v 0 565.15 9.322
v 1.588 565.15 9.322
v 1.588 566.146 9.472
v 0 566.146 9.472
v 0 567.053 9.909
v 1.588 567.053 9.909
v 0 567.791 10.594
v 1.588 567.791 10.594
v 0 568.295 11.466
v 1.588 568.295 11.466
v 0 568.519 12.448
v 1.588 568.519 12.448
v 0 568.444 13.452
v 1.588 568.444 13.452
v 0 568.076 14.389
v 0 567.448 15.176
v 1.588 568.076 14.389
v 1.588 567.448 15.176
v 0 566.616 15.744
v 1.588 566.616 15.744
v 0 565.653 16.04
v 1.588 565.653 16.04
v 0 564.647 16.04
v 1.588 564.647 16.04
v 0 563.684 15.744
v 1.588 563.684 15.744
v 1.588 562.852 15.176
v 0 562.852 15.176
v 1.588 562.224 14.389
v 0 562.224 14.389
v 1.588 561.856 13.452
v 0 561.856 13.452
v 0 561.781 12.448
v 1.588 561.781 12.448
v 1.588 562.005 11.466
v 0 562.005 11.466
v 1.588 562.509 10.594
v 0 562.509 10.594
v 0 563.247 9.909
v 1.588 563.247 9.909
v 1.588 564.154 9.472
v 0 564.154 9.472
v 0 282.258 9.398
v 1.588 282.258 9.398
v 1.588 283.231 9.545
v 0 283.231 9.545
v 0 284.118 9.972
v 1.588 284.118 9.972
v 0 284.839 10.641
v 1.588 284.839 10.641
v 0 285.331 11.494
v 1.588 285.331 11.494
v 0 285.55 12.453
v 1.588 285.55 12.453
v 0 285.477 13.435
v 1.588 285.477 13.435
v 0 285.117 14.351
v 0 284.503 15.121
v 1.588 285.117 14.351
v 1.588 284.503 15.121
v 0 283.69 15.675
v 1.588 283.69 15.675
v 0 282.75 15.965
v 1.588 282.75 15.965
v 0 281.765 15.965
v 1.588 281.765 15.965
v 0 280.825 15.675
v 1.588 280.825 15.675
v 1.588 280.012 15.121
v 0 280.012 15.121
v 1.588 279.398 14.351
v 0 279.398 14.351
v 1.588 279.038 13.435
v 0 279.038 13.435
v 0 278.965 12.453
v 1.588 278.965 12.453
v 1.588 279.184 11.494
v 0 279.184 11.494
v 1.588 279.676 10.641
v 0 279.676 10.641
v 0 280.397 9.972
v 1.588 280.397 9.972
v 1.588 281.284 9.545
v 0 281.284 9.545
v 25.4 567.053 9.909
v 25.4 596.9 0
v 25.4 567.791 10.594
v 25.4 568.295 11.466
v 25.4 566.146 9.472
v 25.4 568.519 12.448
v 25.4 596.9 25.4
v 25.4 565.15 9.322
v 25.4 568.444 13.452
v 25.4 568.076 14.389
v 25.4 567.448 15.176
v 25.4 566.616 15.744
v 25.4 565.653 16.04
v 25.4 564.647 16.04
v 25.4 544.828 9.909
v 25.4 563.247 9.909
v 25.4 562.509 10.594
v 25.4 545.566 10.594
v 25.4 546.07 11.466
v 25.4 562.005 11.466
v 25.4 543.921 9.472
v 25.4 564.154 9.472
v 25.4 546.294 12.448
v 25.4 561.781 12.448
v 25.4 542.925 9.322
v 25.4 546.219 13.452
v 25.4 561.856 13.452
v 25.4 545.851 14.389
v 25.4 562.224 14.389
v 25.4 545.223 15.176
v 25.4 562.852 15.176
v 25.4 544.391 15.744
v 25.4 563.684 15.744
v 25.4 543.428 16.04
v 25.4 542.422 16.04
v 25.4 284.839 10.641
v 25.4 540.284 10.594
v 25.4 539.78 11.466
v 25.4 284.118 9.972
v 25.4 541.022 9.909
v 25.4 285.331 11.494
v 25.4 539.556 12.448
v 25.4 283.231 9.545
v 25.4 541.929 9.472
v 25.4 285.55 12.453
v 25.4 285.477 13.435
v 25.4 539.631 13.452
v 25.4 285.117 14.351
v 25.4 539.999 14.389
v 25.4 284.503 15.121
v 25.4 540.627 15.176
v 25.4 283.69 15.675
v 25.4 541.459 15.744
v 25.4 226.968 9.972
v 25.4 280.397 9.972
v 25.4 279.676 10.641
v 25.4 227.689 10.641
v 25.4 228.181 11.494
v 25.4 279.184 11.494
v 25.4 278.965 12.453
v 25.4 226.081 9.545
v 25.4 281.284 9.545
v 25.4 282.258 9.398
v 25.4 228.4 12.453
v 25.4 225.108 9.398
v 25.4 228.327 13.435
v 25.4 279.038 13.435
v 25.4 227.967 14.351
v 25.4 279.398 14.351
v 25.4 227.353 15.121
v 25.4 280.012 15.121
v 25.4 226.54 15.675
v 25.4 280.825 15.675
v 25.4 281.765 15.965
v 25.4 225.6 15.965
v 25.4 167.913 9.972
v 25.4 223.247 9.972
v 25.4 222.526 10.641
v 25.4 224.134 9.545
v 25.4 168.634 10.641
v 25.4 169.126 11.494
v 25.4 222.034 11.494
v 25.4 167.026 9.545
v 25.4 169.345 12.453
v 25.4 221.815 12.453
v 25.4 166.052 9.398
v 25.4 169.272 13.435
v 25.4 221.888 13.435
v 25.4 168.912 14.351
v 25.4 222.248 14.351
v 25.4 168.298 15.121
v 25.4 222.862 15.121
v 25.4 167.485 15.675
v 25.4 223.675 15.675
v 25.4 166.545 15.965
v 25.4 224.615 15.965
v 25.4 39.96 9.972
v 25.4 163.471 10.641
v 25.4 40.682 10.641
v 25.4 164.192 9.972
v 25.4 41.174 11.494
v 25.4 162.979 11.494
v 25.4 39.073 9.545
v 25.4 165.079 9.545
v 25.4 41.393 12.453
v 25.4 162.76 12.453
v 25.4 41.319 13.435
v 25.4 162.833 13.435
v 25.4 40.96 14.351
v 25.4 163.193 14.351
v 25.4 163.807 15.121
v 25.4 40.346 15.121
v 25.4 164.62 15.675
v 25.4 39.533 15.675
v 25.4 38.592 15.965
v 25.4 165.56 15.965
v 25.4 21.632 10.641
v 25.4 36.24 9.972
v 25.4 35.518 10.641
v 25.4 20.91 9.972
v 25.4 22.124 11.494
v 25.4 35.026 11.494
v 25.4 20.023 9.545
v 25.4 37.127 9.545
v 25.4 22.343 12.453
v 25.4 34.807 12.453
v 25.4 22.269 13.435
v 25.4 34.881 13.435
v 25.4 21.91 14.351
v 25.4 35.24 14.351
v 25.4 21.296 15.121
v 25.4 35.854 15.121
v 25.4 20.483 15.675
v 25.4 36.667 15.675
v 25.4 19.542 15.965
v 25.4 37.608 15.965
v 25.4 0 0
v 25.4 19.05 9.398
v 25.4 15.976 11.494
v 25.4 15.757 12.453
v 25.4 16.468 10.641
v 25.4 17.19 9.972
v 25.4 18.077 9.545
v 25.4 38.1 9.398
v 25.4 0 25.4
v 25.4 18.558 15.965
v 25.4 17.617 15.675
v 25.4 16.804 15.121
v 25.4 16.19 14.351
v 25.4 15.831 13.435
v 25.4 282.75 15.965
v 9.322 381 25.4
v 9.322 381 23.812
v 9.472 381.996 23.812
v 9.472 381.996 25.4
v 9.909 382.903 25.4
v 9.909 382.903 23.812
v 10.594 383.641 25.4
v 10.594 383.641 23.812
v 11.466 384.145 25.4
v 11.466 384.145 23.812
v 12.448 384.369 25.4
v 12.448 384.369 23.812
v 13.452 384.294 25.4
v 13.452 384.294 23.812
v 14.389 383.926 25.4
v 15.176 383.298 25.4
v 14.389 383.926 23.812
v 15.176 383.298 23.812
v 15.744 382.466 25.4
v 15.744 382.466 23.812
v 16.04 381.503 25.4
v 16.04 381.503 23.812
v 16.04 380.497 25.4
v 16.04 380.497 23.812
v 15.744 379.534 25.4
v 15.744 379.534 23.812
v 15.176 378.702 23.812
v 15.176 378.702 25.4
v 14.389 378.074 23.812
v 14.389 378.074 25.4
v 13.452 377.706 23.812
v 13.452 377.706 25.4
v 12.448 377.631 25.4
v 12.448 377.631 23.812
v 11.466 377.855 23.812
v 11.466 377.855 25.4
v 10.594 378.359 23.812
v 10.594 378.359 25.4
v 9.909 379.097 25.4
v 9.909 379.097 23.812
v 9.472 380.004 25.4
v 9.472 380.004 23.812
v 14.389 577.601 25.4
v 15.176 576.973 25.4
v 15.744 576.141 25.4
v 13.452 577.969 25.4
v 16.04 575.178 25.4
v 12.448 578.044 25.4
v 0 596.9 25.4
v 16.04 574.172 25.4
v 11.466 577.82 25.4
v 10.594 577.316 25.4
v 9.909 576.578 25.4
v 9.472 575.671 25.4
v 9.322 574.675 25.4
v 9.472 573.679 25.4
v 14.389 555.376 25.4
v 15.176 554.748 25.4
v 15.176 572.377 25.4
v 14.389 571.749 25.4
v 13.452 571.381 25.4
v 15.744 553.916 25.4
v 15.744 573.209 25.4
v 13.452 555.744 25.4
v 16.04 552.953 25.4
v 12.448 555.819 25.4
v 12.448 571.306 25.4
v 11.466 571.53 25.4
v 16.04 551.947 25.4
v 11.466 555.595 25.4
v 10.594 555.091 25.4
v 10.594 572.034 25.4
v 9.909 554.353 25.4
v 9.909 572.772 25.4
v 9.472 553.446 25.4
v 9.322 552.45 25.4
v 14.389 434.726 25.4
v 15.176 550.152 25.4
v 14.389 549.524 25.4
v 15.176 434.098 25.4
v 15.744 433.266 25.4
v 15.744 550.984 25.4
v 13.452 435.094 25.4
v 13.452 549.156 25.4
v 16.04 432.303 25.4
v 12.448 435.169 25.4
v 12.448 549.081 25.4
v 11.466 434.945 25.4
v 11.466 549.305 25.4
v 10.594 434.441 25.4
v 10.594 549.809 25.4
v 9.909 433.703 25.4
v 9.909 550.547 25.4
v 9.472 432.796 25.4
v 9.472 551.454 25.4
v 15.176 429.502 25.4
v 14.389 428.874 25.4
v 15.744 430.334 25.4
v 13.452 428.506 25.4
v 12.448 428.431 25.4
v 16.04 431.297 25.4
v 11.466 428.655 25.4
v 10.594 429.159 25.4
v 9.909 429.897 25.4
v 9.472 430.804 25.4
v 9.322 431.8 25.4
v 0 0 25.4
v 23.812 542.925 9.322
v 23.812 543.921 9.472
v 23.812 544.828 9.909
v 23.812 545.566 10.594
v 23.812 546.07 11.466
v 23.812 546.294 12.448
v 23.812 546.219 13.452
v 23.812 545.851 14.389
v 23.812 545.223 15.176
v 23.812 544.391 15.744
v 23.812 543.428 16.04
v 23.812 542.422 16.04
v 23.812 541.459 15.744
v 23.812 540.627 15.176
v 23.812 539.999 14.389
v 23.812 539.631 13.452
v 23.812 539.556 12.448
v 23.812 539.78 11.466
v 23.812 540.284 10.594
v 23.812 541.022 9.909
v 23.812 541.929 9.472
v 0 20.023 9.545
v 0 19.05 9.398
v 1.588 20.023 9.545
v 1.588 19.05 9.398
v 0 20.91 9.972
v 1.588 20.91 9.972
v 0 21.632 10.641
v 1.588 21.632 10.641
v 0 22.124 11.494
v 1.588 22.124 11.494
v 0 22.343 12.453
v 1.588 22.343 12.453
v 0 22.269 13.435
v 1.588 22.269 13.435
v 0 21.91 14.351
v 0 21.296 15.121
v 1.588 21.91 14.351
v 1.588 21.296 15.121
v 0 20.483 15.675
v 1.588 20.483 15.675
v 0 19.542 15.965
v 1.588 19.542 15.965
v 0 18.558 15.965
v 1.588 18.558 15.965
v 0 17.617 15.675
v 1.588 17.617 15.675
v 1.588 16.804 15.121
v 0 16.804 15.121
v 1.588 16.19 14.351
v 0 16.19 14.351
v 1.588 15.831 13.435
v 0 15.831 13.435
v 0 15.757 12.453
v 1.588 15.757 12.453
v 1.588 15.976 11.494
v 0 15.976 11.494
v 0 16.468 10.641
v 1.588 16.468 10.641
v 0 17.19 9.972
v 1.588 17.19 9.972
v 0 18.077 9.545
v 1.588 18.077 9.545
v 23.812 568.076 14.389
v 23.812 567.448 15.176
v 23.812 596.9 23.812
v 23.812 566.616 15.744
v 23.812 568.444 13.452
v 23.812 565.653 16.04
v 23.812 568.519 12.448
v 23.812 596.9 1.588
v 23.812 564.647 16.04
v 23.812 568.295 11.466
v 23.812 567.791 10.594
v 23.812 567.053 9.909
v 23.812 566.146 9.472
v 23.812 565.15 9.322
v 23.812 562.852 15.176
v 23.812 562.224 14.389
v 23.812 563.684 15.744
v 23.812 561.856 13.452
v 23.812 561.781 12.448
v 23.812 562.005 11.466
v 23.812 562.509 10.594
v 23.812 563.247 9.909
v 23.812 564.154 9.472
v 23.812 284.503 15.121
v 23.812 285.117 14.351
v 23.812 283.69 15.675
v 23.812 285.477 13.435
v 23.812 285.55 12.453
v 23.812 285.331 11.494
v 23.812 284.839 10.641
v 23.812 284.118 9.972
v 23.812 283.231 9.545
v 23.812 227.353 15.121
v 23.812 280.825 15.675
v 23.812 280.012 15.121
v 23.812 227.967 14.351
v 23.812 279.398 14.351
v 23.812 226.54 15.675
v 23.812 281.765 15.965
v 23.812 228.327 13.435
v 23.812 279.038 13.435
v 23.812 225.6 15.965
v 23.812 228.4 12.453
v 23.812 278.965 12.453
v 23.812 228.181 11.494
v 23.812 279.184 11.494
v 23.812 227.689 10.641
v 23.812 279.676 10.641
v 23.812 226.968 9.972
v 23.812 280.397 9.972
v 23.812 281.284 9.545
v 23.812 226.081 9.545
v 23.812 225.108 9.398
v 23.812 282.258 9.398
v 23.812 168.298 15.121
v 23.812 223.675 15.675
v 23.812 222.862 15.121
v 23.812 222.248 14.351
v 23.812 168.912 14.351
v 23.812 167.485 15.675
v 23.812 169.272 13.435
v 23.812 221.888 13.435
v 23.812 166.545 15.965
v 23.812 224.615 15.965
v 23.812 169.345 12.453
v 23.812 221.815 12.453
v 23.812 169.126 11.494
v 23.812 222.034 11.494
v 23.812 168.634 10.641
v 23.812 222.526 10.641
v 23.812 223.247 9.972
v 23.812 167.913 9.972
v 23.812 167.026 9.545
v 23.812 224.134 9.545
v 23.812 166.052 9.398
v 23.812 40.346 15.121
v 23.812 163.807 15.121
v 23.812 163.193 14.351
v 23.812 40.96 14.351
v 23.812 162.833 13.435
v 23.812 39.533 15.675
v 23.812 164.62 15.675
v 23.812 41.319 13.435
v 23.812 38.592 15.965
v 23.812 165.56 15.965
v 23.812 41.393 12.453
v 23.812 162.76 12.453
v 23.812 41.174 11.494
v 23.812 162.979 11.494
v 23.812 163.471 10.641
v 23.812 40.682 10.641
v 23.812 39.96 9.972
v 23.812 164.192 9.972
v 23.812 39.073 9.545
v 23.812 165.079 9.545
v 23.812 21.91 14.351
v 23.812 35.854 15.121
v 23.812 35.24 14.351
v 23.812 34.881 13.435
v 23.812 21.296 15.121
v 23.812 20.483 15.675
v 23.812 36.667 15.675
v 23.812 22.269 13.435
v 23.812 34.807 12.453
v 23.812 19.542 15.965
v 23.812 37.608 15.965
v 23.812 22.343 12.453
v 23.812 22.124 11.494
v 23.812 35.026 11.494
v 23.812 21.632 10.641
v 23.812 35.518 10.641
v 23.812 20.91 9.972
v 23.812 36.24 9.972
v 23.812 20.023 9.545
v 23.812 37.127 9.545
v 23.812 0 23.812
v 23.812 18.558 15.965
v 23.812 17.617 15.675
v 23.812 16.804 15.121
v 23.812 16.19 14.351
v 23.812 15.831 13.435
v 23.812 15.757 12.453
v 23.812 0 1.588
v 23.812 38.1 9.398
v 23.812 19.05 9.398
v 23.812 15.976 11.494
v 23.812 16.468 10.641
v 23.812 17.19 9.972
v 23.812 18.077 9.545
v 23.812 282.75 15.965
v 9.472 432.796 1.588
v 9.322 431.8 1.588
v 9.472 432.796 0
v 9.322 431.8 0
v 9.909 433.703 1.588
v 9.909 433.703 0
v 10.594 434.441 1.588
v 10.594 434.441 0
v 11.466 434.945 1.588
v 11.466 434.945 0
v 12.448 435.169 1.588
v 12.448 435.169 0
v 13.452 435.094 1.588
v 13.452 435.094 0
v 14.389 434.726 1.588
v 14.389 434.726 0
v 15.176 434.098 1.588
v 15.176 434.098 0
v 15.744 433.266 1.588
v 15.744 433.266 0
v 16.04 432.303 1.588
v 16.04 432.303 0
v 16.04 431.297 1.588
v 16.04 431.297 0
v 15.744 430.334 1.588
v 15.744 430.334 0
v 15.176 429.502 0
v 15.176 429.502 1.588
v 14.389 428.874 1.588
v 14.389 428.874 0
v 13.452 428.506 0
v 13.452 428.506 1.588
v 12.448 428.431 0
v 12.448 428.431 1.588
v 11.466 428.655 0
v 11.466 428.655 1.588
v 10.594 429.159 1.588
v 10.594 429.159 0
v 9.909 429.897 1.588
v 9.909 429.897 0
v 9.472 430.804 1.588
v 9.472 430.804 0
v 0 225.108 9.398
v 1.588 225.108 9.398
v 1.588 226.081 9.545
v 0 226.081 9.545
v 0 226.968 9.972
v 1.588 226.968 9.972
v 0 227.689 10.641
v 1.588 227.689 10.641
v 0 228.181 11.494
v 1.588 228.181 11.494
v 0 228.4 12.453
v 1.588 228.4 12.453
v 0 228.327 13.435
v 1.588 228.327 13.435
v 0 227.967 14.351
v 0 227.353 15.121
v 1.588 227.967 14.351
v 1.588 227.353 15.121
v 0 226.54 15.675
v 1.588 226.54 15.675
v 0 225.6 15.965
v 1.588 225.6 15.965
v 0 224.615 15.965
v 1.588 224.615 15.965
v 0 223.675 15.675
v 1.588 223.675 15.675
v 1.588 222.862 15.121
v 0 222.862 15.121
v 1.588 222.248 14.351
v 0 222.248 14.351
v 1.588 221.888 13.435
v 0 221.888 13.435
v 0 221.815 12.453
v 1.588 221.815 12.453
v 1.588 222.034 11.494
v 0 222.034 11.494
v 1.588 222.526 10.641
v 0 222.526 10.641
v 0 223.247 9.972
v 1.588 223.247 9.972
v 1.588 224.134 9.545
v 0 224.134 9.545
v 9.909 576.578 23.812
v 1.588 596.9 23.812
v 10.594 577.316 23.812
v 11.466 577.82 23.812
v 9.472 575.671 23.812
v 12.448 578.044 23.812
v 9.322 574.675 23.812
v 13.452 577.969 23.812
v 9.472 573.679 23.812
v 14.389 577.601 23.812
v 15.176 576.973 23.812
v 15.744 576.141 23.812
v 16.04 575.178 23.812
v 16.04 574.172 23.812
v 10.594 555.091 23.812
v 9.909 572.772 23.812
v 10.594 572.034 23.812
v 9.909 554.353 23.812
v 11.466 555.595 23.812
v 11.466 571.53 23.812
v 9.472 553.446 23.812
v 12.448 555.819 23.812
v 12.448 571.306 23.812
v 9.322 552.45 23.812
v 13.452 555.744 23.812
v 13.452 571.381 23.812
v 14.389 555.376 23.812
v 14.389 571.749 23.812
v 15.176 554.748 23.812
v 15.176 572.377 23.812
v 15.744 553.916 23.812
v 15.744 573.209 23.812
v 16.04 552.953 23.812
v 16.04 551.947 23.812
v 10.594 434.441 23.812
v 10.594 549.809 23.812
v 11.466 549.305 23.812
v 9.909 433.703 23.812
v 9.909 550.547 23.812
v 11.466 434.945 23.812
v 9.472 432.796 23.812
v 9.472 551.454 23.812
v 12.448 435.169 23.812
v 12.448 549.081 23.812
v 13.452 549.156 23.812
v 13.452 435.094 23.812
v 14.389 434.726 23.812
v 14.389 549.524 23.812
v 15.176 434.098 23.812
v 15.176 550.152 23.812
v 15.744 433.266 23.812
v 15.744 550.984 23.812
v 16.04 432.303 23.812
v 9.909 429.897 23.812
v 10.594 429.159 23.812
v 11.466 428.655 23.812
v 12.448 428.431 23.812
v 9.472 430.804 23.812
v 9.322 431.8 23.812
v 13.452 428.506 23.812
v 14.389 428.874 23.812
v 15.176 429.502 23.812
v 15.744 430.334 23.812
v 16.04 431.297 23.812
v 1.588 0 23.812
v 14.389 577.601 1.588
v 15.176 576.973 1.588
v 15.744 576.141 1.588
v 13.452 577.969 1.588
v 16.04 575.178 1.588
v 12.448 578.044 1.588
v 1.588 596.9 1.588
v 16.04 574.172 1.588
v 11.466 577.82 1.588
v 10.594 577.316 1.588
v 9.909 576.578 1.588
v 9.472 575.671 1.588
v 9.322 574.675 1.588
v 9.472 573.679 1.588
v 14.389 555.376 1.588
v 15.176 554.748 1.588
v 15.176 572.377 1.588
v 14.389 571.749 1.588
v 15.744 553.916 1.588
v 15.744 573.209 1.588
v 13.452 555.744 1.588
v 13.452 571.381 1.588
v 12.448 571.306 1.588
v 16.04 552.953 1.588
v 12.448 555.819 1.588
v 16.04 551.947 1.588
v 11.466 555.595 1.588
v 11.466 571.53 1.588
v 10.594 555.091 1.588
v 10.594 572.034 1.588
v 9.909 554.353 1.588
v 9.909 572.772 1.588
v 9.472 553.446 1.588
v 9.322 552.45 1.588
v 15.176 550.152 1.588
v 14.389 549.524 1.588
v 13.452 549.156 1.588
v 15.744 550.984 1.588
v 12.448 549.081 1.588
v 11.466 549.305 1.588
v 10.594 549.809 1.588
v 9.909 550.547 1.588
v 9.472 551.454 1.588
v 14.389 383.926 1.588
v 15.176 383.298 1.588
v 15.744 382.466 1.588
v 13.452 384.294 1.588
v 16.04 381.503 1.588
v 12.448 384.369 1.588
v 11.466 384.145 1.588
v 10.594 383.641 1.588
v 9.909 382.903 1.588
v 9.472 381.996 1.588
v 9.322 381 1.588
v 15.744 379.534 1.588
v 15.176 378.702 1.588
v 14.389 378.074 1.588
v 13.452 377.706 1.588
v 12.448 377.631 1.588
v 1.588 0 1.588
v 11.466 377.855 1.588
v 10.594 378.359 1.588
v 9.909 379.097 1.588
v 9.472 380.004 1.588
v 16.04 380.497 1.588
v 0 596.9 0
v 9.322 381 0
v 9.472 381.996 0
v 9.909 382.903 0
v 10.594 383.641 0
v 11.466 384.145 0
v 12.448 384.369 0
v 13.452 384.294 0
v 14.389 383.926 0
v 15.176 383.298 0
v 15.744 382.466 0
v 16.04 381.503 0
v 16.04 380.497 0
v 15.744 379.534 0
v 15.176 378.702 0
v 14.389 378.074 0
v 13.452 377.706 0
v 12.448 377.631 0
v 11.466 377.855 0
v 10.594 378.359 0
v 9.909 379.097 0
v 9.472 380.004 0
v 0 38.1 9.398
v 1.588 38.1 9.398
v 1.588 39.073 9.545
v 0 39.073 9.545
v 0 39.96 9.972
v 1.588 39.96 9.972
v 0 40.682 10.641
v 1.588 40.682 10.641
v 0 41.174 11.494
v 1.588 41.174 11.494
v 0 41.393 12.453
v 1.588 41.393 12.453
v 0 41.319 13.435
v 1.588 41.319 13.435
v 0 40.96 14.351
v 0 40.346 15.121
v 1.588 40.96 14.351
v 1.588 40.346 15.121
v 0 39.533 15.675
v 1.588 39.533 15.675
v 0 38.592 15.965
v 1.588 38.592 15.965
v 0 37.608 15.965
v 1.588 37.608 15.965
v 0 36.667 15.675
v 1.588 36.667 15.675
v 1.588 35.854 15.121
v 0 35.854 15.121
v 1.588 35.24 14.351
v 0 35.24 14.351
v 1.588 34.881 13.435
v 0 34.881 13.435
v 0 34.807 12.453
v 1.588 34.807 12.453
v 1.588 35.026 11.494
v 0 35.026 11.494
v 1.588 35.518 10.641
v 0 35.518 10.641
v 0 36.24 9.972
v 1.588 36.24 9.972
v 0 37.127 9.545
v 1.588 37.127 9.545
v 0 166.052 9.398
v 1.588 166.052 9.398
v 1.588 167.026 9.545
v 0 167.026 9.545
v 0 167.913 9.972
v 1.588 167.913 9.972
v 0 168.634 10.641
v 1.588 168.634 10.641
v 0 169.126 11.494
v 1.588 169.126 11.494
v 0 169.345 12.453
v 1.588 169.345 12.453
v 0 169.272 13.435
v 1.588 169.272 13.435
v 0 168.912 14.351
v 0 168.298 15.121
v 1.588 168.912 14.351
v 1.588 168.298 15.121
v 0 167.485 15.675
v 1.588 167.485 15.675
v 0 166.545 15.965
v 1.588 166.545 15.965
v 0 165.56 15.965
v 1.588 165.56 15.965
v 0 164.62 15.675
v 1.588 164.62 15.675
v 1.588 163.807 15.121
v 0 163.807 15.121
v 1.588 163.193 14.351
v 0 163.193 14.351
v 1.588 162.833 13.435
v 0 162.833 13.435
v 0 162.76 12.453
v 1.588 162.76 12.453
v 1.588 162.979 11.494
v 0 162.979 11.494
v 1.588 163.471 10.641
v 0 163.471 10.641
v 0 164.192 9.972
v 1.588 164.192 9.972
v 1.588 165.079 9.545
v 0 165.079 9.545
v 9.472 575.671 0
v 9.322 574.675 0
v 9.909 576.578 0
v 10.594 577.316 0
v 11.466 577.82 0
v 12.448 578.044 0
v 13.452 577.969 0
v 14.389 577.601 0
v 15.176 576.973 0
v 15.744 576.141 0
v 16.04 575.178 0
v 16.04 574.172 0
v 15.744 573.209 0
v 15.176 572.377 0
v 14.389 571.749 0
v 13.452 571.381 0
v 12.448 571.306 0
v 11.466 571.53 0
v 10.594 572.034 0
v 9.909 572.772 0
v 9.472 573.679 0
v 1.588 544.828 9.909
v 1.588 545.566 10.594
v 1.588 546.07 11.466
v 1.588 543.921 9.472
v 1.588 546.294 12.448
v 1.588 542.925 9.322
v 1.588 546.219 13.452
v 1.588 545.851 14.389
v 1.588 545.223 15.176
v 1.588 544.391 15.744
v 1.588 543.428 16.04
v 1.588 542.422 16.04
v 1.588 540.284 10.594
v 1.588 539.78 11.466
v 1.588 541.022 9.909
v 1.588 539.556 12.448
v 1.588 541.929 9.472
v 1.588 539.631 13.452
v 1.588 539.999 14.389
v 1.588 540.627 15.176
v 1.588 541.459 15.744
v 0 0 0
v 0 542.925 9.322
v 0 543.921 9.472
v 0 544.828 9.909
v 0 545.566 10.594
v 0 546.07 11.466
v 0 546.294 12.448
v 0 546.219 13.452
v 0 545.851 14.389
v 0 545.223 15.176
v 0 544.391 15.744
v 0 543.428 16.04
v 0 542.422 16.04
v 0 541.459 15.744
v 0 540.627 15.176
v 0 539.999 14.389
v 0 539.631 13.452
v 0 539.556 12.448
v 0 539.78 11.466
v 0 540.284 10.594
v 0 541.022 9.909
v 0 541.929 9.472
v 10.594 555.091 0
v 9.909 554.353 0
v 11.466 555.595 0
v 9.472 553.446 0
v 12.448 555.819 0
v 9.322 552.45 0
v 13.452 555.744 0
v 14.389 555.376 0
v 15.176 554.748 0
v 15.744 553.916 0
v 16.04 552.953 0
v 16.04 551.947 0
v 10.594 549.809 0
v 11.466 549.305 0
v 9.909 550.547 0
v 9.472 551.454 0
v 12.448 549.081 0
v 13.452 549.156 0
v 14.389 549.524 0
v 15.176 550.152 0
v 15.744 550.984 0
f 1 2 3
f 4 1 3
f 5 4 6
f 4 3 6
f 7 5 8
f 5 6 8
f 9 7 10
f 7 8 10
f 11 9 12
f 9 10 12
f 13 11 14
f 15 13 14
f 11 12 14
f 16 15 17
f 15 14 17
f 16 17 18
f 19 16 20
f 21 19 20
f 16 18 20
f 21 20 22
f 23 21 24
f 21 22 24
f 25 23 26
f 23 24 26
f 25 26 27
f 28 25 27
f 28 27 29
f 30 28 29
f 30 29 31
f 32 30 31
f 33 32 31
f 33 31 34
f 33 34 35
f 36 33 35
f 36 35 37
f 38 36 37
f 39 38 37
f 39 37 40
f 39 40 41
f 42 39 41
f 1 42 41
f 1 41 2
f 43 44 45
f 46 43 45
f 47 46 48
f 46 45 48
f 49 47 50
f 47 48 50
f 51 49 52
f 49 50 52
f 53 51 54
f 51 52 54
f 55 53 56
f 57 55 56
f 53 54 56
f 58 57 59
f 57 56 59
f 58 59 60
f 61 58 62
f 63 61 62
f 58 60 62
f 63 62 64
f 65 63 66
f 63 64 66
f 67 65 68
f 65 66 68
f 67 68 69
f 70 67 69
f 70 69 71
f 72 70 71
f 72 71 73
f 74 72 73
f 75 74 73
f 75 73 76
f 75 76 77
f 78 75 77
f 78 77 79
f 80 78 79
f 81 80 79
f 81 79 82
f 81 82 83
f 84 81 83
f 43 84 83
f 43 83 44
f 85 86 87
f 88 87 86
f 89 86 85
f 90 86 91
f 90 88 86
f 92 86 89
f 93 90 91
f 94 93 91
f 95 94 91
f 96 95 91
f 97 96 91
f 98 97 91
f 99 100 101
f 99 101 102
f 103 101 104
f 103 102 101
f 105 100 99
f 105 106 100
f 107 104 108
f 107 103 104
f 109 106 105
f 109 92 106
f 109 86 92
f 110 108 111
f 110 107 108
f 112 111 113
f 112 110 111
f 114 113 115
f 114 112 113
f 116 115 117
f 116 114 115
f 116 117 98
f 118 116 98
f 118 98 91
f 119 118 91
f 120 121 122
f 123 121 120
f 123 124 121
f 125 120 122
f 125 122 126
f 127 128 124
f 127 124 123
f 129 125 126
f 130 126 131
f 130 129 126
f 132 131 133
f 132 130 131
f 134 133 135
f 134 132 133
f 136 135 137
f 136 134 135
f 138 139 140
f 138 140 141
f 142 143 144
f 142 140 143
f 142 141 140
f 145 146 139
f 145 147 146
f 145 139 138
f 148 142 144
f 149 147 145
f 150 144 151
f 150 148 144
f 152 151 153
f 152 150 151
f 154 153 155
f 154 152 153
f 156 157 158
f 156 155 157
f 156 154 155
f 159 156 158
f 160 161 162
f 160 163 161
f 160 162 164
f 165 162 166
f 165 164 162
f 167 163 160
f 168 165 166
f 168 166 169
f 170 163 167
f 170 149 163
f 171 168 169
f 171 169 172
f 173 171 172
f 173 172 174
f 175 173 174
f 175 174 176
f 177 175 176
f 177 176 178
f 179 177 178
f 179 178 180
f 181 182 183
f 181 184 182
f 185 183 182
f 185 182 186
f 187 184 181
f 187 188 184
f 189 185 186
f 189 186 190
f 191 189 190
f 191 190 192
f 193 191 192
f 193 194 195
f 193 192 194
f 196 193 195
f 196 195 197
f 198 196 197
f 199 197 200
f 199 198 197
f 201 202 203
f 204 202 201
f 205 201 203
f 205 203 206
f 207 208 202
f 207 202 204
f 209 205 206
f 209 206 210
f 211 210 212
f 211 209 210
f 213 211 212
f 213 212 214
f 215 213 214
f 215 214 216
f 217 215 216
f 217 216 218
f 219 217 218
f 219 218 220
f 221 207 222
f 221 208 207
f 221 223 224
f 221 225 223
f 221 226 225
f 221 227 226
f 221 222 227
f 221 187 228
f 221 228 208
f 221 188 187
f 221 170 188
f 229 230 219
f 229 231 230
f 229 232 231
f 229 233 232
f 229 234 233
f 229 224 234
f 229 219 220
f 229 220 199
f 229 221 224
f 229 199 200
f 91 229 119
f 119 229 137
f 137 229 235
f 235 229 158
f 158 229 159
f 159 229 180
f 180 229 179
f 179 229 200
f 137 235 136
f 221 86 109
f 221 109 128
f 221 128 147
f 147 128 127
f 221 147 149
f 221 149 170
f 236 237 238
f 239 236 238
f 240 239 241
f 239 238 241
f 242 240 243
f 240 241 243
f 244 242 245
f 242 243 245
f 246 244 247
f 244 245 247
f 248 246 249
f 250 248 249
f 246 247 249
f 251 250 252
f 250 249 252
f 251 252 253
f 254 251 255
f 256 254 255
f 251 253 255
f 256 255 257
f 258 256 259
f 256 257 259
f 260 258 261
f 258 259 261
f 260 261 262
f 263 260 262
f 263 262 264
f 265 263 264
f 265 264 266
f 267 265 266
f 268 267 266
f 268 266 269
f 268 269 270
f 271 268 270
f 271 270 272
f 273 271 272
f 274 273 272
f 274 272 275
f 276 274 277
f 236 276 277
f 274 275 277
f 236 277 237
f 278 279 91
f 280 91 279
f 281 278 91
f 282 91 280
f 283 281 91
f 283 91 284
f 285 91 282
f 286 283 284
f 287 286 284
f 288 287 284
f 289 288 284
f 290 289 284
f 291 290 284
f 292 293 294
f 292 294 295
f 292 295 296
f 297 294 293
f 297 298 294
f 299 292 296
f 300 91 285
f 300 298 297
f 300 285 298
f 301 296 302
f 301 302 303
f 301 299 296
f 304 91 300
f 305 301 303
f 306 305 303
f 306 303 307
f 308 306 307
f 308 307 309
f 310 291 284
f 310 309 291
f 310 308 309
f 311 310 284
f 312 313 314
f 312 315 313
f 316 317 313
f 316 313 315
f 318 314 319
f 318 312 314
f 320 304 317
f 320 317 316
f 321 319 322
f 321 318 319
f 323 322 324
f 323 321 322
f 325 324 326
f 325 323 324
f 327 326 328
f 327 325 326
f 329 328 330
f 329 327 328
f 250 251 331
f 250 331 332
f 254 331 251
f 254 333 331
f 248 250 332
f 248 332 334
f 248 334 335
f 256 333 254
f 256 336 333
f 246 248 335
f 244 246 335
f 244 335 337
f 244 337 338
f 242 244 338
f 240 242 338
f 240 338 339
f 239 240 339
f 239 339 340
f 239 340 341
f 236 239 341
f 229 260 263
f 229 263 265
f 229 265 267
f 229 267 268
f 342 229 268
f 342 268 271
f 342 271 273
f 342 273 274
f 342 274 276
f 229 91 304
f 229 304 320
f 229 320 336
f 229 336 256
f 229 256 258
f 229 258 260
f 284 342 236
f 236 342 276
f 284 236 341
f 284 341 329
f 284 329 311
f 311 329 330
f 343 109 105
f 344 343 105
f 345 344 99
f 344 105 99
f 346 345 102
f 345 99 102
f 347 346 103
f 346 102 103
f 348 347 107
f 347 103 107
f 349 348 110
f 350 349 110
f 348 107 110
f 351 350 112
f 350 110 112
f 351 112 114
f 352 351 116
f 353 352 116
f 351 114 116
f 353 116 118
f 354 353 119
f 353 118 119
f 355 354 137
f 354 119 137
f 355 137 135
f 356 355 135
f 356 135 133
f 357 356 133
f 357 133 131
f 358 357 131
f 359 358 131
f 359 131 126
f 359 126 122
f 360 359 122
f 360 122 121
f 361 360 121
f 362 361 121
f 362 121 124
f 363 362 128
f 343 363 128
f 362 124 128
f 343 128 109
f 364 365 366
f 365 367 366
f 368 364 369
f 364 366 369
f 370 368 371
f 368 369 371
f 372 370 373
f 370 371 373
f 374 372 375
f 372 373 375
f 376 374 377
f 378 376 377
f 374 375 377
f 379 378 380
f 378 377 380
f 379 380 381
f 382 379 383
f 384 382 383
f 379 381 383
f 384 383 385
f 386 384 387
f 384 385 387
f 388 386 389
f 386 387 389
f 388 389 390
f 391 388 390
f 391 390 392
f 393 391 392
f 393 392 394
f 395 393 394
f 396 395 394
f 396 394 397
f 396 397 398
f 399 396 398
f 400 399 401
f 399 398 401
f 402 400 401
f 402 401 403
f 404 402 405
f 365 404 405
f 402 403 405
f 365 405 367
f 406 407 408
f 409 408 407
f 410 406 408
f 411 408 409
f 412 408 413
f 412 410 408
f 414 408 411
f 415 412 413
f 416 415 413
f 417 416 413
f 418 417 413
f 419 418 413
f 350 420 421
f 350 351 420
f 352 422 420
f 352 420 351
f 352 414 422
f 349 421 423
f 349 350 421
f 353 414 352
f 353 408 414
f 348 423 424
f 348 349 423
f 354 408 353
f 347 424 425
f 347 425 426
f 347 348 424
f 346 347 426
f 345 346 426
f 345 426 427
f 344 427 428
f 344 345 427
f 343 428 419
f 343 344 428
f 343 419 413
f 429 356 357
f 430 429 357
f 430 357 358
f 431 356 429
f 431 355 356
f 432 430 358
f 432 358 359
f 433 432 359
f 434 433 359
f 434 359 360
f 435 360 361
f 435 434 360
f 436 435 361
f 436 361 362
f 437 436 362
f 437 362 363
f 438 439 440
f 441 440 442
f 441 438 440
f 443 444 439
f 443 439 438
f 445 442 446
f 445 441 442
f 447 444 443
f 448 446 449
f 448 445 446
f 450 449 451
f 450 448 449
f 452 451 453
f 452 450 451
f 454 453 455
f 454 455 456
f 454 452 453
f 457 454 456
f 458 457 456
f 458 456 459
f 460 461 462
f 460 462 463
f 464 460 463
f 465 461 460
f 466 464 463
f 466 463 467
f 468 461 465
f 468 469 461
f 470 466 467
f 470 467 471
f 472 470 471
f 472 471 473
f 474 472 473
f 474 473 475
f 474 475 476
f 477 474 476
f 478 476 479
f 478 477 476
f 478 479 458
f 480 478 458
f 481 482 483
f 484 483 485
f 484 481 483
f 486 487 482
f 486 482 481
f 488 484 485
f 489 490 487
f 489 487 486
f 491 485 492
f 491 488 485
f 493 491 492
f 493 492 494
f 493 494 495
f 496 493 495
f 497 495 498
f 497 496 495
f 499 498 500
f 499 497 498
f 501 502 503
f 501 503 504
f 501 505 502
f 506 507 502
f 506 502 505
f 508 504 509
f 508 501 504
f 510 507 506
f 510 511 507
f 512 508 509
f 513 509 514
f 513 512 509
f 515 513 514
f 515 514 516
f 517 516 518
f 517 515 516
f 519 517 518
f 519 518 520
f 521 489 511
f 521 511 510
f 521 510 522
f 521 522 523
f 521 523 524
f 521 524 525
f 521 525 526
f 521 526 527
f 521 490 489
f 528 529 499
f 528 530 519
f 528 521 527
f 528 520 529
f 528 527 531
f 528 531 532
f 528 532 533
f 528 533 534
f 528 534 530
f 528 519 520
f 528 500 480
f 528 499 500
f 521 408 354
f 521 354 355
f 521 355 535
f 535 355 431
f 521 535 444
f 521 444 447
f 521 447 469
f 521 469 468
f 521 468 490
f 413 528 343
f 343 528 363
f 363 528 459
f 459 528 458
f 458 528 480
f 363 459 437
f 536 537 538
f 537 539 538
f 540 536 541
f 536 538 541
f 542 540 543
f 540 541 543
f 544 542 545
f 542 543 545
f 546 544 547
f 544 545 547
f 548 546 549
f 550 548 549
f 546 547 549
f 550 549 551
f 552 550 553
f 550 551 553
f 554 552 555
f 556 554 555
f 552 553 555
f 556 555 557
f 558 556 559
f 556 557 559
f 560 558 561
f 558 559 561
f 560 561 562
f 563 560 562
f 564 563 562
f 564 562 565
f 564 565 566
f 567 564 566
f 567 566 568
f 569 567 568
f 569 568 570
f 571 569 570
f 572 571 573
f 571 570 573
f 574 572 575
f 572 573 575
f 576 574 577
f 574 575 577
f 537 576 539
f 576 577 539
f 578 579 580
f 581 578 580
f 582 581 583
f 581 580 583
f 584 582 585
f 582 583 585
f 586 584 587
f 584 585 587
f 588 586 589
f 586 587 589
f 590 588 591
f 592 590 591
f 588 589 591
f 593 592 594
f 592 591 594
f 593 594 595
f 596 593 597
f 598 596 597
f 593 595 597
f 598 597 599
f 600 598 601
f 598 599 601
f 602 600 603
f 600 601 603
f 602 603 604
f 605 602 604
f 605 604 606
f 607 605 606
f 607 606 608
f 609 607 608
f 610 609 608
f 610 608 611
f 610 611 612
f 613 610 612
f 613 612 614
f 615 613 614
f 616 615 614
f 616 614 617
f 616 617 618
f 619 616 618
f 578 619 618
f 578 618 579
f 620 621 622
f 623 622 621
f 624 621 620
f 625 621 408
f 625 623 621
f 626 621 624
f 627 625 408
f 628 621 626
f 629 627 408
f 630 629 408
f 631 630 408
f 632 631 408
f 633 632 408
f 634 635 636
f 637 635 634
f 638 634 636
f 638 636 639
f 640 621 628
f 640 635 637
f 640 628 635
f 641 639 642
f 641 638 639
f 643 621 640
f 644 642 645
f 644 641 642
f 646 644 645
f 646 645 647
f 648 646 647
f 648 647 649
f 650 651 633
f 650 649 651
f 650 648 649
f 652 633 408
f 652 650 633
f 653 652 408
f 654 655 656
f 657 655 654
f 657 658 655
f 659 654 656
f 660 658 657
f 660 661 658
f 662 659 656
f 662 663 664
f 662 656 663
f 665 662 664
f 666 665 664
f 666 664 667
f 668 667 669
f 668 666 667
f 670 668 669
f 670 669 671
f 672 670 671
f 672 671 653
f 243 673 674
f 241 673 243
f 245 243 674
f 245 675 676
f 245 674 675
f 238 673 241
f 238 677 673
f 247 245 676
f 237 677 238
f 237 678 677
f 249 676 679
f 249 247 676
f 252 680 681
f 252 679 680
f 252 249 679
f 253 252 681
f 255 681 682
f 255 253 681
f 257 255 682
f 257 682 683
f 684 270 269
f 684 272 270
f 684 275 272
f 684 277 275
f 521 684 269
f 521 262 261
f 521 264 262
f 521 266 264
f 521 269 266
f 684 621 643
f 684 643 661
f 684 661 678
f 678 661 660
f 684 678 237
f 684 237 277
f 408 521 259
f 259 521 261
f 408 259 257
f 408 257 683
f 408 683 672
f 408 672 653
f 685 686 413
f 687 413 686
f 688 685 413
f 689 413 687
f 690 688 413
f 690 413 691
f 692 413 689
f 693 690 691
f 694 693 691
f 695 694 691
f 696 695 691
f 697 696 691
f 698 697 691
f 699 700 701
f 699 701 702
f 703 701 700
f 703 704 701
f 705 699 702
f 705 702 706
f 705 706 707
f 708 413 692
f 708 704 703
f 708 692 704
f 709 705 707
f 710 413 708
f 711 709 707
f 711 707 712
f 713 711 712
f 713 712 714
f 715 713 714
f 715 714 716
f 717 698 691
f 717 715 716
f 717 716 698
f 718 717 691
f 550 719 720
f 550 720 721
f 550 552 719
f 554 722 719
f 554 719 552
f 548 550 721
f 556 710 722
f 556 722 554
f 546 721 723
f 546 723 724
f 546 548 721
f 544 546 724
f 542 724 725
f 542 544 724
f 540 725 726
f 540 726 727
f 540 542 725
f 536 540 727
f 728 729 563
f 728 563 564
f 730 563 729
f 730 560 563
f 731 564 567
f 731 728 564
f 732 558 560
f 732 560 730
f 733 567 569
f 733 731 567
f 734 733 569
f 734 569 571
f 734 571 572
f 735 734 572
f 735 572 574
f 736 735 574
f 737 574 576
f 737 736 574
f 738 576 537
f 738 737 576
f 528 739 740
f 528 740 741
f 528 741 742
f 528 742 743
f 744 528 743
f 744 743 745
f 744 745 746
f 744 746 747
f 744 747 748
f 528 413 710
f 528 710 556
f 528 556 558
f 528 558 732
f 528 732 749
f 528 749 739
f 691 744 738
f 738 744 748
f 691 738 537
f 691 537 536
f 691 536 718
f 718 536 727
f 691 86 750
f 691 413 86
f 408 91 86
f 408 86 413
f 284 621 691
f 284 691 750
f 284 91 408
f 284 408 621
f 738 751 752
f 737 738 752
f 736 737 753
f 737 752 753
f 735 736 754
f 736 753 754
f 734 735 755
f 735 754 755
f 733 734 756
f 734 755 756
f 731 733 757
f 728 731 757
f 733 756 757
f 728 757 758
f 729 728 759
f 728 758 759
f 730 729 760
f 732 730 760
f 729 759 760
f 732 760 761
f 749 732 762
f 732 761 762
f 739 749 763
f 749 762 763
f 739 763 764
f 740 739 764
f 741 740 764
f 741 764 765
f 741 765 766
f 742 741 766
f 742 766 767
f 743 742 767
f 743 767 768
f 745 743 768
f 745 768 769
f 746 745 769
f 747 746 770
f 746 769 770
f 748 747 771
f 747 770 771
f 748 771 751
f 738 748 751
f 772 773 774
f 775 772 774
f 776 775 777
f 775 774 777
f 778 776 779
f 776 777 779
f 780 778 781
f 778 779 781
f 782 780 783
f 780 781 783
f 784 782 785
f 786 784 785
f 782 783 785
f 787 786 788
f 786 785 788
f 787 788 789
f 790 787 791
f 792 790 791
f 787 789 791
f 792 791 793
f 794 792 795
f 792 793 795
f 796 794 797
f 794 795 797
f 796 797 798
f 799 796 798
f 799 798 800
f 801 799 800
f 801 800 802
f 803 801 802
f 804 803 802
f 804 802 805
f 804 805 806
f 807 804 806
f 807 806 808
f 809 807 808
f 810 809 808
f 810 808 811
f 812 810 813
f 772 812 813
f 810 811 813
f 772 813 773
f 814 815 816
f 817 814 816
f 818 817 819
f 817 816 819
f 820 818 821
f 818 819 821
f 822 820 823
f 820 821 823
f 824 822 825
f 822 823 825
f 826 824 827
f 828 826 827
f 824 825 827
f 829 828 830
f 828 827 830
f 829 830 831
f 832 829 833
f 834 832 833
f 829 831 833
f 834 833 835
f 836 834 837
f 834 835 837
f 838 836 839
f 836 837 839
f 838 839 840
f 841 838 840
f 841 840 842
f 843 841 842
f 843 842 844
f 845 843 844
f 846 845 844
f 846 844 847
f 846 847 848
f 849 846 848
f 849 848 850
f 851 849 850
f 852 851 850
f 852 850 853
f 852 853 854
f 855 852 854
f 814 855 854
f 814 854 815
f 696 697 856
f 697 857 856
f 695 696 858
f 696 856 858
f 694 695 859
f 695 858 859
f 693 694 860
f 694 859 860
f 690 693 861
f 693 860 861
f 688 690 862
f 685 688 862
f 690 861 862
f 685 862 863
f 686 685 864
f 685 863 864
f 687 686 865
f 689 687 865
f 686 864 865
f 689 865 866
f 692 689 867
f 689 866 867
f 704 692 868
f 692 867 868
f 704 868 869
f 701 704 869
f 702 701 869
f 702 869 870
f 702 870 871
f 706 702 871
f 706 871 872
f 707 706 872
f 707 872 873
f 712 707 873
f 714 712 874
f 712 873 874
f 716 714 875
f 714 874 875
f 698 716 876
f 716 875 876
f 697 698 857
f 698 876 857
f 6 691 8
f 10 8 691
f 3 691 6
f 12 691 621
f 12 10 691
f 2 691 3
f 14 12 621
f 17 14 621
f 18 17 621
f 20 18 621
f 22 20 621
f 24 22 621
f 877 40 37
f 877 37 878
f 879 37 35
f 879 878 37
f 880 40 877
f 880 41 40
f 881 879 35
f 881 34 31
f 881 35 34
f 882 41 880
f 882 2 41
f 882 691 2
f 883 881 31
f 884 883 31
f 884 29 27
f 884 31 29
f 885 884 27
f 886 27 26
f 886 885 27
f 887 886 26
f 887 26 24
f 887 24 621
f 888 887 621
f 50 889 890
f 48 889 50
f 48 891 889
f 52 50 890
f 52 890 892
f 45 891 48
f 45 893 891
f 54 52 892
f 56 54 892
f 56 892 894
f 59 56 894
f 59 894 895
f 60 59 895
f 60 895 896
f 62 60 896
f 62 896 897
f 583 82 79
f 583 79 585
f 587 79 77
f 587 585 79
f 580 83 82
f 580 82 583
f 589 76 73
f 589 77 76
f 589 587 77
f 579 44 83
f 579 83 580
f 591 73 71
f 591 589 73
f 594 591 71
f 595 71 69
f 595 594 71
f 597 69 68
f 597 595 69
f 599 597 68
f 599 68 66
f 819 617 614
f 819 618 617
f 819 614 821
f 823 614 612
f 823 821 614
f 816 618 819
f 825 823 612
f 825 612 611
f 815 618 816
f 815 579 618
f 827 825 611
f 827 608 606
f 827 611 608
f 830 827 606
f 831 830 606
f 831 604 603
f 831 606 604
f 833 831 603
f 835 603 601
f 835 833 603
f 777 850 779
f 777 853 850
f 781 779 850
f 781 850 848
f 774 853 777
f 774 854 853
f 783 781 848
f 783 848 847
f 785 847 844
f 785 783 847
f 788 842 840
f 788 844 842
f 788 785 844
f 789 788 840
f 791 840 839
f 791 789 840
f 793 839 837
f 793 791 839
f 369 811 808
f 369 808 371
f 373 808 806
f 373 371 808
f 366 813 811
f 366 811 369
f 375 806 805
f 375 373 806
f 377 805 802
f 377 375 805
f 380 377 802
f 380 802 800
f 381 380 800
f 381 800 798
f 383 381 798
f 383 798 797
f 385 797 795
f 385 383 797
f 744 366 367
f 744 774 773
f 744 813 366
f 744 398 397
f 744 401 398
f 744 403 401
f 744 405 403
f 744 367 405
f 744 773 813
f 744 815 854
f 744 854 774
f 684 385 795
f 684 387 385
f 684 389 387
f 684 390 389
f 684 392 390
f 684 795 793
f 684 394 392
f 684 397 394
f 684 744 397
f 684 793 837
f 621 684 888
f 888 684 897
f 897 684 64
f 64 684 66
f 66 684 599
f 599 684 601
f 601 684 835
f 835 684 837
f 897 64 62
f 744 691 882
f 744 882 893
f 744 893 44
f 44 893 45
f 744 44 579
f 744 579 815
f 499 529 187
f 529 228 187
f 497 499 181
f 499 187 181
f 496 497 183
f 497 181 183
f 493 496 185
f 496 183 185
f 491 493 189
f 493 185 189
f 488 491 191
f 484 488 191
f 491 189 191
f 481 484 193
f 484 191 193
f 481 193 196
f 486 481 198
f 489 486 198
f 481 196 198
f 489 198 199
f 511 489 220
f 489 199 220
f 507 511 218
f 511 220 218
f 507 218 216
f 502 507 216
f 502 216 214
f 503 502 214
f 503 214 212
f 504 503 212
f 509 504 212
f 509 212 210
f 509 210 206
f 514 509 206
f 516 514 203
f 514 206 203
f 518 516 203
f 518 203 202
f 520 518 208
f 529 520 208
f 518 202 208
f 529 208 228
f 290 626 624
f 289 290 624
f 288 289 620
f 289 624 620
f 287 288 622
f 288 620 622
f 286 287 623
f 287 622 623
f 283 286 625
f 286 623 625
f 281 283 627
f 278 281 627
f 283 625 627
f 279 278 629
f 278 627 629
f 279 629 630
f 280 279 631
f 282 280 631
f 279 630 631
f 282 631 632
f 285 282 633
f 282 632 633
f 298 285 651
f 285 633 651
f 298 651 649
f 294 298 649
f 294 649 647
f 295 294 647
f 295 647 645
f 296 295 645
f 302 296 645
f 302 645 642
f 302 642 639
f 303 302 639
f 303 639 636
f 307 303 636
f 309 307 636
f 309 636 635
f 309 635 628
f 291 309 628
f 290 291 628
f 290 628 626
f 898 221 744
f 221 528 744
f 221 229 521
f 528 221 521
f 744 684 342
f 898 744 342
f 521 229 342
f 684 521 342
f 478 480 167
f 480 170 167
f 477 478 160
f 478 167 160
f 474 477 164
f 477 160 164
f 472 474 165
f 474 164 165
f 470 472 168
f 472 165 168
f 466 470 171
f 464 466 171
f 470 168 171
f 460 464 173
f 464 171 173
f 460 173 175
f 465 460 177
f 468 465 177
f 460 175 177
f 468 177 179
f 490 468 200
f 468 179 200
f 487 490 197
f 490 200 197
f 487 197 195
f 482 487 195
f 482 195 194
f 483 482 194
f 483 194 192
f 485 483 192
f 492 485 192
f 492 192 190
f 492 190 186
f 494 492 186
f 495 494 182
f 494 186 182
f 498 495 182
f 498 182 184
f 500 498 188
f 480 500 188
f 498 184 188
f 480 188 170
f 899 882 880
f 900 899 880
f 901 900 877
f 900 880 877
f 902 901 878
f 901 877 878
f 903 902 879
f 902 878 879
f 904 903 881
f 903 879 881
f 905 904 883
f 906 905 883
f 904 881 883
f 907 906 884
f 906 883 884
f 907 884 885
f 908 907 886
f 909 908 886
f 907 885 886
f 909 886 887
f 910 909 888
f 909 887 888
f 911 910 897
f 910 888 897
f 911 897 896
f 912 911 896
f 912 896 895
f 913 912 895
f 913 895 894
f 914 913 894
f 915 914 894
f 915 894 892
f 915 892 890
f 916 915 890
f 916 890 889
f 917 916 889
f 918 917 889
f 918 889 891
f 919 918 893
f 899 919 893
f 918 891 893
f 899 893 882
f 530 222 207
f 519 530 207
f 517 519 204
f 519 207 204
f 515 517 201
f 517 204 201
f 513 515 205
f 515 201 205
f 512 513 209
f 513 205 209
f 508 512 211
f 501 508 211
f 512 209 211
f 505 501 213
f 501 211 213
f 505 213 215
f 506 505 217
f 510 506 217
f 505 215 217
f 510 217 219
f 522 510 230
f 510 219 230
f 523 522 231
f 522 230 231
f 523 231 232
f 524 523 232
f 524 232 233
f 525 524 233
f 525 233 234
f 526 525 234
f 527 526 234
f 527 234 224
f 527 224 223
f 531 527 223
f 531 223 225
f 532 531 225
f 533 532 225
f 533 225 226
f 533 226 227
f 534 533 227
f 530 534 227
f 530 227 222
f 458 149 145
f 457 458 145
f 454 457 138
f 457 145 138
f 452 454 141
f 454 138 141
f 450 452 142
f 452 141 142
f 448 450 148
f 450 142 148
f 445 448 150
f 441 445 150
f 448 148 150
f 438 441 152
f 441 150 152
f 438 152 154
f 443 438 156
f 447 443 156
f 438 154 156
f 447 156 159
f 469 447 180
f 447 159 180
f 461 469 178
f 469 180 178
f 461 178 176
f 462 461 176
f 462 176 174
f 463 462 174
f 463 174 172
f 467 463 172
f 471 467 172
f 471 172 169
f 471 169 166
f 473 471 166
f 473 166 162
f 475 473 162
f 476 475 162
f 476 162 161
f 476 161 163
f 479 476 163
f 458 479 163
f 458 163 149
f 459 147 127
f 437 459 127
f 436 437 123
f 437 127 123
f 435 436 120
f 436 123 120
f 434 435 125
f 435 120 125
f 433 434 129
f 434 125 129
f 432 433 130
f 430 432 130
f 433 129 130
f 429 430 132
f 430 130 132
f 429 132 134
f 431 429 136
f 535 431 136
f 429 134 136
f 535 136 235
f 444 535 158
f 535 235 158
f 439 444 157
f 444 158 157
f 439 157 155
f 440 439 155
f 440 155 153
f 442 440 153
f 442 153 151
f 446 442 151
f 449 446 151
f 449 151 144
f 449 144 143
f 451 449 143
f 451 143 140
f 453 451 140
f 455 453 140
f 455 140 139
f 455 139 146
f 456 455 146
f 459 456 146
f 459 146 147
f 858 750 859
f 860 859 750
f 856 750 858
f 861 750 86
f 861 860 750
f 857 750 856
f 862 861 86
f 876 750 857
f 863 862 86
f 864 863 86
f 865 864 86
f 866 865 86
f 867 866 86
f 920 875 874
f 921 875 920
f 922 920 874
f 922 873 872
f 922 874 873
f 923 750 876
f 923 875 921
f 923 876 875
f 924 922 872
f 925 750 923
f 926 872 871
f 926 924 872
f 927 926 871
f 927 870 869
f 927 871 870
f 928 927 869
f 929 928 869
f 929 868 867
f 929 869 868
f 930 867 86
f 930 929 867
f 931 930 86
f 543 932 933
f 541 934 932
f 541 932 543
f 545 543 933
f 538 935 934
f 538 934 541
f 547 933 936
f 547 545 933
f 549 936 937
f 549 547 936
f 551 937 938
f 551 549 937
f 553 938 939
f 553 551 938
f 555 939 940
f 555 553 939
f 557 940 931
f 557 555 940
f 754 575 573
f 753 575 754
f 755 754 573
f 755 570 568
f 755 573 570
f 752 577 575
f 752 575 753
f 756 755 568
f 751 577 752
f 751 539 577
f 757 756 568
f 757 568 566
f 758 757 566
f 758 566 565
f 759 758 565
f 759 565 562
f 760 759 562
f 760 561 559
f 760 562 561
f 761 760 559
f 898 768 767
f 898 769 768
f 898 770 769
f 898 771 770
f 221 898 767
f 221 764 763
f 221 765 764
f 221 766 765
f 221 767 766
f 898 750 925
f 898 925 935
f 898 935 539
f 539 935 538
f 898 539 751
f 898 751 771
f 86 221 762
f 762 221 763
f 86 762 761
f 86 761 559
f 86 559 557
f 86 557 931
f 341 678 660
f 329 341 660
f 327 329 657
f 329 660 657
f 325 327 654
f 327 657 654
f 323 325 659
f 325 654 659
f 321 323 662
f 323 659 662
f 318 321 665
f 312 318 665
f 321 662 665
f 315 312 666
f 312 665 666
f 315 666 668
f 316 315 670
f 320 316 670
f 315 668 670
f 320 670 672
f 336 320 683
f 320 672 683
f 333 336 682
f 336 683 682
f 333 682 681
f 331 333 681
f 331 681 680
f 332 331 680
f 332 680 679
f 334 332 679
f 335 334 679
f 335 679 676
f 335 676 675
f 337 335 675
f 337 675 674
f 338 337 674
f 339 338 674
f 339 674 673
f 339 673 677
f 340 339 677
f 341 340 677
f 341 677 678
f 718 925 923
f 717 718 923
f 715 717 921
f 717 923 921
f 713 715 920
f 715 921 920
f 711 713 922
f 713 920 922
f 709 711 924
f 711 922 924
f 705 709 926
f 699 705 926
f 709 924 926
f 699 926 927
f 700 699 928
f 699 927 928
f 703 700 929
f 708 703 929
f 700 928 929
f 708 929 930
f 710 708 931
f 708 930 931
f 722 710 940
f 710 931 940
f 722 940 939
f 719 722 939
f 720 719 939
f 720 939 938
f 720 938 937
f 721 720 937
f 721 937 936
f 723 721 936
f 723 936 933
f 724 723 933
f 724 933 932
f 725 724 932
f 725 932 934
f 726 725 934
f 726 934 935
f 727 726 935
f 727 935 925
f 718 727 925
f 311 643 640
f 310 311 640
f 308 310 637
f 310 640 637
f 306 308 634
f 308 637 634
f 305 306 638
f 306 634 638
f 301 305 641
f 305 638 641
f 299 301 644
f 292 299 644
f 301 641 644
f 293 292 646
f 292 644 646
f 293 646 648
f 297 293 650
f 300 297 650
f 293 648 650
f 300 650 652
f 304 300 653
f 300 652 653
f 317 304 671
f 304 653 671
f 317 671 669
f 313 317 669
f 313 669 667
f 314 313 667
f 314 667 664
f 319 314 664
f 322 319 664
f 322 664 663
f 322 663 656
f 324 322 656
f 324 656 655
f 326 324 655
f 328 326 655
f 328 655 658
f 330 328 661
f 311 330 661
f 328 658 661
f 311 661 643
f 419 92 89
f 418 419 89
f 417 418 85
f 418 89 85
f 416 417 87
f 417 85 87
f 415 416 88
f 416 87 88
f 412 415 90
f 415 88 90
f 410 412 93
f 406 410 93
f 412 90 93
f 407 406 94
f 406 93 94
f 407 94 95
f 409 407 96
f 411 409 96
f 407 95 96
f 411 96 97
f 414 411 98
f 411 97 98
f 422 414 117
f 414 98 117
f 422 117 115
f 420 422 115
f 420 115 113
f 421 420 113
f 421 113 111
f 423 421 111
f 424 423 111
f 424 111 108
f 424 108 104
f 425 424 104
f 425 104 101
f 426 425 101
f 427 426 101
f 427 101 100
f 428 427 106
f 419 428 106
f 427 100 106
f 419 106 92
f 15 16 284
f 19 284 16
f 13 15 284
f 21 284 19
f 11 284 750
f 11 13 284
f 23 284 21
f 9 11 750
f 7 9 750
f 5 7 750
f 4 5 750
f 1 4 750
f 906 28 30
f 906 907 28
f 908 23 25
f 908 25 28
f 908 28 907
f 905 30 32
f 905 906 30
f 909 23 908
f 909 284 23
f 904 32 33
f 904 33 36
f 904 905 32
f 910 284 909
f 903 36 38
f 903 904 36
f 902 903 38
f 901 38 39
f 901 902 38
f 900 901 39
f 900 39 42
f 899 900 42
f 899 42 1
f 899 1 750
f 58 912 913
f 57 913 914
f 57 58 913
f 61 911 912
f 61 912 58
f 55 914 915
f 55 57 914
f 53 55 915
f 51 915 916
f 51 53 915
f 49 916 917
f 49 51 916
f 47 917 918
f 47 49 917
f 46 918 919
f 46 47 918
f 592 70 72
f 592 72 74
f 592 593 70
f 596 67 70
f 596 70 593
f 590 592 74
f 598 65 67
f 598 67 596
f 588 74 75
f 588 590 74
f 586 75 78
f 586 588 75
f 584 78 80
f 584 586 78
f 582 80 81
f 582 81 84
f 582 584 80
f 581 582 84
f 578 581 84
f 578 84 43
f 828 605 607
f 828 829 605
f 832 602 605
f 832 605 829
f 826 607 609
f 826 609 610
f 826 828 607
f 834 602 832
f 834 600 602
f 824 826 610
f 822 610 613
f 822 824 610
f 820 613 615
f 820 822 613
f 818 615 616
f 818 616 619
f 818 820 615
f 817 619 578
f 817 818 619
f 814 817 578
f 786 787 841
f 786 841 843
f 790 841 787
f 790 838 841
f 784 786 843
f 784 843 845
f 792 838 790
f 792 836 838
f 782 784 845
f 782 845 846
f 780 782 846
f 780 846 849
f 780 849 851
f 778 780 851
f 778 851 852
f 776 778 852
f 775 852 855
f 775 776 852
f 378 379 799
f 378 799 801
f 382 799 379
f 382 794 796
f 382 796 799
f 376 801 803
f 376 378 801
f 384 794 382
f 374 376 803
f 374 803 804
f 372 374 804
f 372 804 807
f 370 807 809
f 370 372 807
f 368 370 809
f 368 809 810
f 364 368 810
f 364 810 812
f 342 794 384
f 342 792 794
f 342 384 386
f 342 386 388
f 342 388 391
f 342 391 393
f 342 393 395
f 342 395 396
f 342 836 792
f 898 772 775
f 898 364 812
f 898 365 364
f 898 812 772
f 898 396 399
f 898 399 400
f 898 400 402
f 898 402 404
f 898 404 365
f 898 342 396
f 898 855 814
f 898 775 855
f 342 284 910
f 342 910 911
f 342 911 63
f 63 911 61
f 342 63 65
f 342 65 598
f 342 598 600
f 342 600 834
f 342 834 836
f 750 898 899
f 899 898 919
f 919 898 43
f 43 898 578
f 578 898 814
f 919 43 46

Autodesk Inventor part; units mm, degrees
ref_plane "YZ Plane" through (0, 0, 0) normal (1, 0, 0) x (0, 1, 0)
ref_plane "XZ Plane" through (0, 0, 0) normal (0, 1, 0) x (-1, 0, 0)
ref_plane "XY Plane" through (0, 0, 0) normal (0, 0, 1) x (1, 0, 0)
sketch "Sketch1" plane through (0, 0, 0) normal (0, 1, 0) x (-1, 0, 0)
  line L0 (0, 0) -> (-25.4, 0)
  line L1 (-25.4, 0) -> (-25.4, 25.4)
  line L2 (-25.4, 25.4) -> (0, 25.4)
  line L3 (0, 25.4) -> (0, 0)
  line L4 (-1.5875, 23.8125) -> (-23.8125, 23.8125)
  line L5 (-23.8125, 23.8125) -> (-23.8125, 1.5875)
  line L6 (-23.8125, 1.5875) -> (-1.5875, 1.5875)
  line L7 (-1.5875, 1.5875) -> (-1.5875, 23.8125)
  dimension "d0" = 25.4
  dimension "d2" = 25.4
  dimension "d3" = 1.5875
extrude "Extrusion1" add sketch "Sketch1" along normal blind 596.9
sketch "Sketch7" plane through (25.4, 0, 0) normal (0, 0, -1) x (-1, 0, 0)
  circle A0 centre (12.7, 552.45) radius 3.3782
  circle A1 centre (12.7, 574.675) radius 3.3782
extrude "Extrusion6" cut sketch "Sketch7" against normal blind 25.4
sketch "Sketch8" plane through (25.4, 0, 25.4) normal (1, 0, 0) x (0, 0, -1)
  circle A0 centre (12.7, 565.15) radius 3.3782
  circle A1 centre (12.7, 542.925) radius 3.3782
  circle A2 centre (12.7, 19.05) radius 3.302 projected
  circle A3 centre (12.7, 38.1) radius 3.302 projected
  arc A4 (25.4, 47.625) -> (22.225, 50.8) centre (22.225, 47.625) ccw projected
  line L0 (22.225, 50.8) -> (3.175, 50.8) projected
  arc A5 (3.175, 50.8) -> (0, 47.625) centre (3.175, 47.625) ccw projected
  line L1 (0, 47.625) -> (0, 4.445) projected
  line L2 (0, 4.445) -> (25.4, 4.445) projected
  line L3 (25.4, 47.625) -> (25.4, 4.445) projected
  arc A6 (22.225, 155.2575) -> (25.4, 158.4325) centre (22.225, 158.4325) ccw projected
  line L4 (3.175, 155.2575) -> (22.225, 155.2575) projected
  arc A7 (0, 158.4325) -> (3.175, 155.2575) centre (3.175, 158.4325) ccw projected
  line L5 (0, 177.4825) -> (0, 158.4325) projected
  arc A8 (0, 177.4825) -> (-3.175, 180.6575) centre (-3.175, 177.4825) ccw projected
  line L6 (-7.0866, 180.6575) -> (-3.175, 180.6575) projected
  line L7 (-7.0866, 180.6575) -> (-7.0866, 244.1575) projected
  line L8 (-3.175, 244.1575) -> (-7.0866, 244.1575) projected
  arc A9 (-3.175, 244.1575) -> (0, 247.3325) centre (-3.175, 247.3325) ccw projected
  line L9 (0, 291.7825) -> (0, 247.3325) projected
  arc A10 (3.175, 294.9575) -> (0, 291.7825) centre (3.175, 291.7825) ccw projected
  line L10 (22.225, 294.9575) -> (3.175, 294.9575) projected
  arc A11 (25.4, 291.7825) -> (22.225, 294.9575) centre (22.225, 291.7825) ccw projected
  line L11 (25.4, 158.4325) -> (25.4, 291.7825) projected
  circle A12 centre (12.7, 166.0525) radius 3.302 projected
  circle A13 centre (12.7, 199.7075) radius 3.302 projected
  circle A14 centre (12.7, 225.1075) radius 3.302 projected
  circle A15 centre (12.7, 253.6825) radius 3.302 projected
  circle A16 centre (12.7, 282.2575) radius 3.302 projected
extrude "Extrusion7" cut sketch "Sketch8" against normal blind 25.4 contours A0 | A1 | A2 | A3 | A12 | A14 | A16
sketch "Sketch9" plane through (25.4, 0, 0) normal (0, 0, -1) x (-1, 0, 0)
  circle A0 centre (12.7, 431.8) radius 3.3782 projected
  line L0 (25.4, 440.055) -> (0, 440.055) projected
  line L1 (0, 368.3) -> (0, 440.055) projected
  line L2 (25.4, 368.3) -> (0, 368.3) projected
  line L3 (25.4, 440.055) -> (25.4, 368.3) projected
  circle A1 centre (12.7, 431.8) radius 3.3782 projected
  circle A2 centre (12.7, 381) radius 3.3782 projected
extrude "Extrusion8" cut sketch "Sketch9" against normal blind 25.4 contours A0 | A2
properties part number "Rebuild Edge Mount 1" material "Aluminum 6061"
